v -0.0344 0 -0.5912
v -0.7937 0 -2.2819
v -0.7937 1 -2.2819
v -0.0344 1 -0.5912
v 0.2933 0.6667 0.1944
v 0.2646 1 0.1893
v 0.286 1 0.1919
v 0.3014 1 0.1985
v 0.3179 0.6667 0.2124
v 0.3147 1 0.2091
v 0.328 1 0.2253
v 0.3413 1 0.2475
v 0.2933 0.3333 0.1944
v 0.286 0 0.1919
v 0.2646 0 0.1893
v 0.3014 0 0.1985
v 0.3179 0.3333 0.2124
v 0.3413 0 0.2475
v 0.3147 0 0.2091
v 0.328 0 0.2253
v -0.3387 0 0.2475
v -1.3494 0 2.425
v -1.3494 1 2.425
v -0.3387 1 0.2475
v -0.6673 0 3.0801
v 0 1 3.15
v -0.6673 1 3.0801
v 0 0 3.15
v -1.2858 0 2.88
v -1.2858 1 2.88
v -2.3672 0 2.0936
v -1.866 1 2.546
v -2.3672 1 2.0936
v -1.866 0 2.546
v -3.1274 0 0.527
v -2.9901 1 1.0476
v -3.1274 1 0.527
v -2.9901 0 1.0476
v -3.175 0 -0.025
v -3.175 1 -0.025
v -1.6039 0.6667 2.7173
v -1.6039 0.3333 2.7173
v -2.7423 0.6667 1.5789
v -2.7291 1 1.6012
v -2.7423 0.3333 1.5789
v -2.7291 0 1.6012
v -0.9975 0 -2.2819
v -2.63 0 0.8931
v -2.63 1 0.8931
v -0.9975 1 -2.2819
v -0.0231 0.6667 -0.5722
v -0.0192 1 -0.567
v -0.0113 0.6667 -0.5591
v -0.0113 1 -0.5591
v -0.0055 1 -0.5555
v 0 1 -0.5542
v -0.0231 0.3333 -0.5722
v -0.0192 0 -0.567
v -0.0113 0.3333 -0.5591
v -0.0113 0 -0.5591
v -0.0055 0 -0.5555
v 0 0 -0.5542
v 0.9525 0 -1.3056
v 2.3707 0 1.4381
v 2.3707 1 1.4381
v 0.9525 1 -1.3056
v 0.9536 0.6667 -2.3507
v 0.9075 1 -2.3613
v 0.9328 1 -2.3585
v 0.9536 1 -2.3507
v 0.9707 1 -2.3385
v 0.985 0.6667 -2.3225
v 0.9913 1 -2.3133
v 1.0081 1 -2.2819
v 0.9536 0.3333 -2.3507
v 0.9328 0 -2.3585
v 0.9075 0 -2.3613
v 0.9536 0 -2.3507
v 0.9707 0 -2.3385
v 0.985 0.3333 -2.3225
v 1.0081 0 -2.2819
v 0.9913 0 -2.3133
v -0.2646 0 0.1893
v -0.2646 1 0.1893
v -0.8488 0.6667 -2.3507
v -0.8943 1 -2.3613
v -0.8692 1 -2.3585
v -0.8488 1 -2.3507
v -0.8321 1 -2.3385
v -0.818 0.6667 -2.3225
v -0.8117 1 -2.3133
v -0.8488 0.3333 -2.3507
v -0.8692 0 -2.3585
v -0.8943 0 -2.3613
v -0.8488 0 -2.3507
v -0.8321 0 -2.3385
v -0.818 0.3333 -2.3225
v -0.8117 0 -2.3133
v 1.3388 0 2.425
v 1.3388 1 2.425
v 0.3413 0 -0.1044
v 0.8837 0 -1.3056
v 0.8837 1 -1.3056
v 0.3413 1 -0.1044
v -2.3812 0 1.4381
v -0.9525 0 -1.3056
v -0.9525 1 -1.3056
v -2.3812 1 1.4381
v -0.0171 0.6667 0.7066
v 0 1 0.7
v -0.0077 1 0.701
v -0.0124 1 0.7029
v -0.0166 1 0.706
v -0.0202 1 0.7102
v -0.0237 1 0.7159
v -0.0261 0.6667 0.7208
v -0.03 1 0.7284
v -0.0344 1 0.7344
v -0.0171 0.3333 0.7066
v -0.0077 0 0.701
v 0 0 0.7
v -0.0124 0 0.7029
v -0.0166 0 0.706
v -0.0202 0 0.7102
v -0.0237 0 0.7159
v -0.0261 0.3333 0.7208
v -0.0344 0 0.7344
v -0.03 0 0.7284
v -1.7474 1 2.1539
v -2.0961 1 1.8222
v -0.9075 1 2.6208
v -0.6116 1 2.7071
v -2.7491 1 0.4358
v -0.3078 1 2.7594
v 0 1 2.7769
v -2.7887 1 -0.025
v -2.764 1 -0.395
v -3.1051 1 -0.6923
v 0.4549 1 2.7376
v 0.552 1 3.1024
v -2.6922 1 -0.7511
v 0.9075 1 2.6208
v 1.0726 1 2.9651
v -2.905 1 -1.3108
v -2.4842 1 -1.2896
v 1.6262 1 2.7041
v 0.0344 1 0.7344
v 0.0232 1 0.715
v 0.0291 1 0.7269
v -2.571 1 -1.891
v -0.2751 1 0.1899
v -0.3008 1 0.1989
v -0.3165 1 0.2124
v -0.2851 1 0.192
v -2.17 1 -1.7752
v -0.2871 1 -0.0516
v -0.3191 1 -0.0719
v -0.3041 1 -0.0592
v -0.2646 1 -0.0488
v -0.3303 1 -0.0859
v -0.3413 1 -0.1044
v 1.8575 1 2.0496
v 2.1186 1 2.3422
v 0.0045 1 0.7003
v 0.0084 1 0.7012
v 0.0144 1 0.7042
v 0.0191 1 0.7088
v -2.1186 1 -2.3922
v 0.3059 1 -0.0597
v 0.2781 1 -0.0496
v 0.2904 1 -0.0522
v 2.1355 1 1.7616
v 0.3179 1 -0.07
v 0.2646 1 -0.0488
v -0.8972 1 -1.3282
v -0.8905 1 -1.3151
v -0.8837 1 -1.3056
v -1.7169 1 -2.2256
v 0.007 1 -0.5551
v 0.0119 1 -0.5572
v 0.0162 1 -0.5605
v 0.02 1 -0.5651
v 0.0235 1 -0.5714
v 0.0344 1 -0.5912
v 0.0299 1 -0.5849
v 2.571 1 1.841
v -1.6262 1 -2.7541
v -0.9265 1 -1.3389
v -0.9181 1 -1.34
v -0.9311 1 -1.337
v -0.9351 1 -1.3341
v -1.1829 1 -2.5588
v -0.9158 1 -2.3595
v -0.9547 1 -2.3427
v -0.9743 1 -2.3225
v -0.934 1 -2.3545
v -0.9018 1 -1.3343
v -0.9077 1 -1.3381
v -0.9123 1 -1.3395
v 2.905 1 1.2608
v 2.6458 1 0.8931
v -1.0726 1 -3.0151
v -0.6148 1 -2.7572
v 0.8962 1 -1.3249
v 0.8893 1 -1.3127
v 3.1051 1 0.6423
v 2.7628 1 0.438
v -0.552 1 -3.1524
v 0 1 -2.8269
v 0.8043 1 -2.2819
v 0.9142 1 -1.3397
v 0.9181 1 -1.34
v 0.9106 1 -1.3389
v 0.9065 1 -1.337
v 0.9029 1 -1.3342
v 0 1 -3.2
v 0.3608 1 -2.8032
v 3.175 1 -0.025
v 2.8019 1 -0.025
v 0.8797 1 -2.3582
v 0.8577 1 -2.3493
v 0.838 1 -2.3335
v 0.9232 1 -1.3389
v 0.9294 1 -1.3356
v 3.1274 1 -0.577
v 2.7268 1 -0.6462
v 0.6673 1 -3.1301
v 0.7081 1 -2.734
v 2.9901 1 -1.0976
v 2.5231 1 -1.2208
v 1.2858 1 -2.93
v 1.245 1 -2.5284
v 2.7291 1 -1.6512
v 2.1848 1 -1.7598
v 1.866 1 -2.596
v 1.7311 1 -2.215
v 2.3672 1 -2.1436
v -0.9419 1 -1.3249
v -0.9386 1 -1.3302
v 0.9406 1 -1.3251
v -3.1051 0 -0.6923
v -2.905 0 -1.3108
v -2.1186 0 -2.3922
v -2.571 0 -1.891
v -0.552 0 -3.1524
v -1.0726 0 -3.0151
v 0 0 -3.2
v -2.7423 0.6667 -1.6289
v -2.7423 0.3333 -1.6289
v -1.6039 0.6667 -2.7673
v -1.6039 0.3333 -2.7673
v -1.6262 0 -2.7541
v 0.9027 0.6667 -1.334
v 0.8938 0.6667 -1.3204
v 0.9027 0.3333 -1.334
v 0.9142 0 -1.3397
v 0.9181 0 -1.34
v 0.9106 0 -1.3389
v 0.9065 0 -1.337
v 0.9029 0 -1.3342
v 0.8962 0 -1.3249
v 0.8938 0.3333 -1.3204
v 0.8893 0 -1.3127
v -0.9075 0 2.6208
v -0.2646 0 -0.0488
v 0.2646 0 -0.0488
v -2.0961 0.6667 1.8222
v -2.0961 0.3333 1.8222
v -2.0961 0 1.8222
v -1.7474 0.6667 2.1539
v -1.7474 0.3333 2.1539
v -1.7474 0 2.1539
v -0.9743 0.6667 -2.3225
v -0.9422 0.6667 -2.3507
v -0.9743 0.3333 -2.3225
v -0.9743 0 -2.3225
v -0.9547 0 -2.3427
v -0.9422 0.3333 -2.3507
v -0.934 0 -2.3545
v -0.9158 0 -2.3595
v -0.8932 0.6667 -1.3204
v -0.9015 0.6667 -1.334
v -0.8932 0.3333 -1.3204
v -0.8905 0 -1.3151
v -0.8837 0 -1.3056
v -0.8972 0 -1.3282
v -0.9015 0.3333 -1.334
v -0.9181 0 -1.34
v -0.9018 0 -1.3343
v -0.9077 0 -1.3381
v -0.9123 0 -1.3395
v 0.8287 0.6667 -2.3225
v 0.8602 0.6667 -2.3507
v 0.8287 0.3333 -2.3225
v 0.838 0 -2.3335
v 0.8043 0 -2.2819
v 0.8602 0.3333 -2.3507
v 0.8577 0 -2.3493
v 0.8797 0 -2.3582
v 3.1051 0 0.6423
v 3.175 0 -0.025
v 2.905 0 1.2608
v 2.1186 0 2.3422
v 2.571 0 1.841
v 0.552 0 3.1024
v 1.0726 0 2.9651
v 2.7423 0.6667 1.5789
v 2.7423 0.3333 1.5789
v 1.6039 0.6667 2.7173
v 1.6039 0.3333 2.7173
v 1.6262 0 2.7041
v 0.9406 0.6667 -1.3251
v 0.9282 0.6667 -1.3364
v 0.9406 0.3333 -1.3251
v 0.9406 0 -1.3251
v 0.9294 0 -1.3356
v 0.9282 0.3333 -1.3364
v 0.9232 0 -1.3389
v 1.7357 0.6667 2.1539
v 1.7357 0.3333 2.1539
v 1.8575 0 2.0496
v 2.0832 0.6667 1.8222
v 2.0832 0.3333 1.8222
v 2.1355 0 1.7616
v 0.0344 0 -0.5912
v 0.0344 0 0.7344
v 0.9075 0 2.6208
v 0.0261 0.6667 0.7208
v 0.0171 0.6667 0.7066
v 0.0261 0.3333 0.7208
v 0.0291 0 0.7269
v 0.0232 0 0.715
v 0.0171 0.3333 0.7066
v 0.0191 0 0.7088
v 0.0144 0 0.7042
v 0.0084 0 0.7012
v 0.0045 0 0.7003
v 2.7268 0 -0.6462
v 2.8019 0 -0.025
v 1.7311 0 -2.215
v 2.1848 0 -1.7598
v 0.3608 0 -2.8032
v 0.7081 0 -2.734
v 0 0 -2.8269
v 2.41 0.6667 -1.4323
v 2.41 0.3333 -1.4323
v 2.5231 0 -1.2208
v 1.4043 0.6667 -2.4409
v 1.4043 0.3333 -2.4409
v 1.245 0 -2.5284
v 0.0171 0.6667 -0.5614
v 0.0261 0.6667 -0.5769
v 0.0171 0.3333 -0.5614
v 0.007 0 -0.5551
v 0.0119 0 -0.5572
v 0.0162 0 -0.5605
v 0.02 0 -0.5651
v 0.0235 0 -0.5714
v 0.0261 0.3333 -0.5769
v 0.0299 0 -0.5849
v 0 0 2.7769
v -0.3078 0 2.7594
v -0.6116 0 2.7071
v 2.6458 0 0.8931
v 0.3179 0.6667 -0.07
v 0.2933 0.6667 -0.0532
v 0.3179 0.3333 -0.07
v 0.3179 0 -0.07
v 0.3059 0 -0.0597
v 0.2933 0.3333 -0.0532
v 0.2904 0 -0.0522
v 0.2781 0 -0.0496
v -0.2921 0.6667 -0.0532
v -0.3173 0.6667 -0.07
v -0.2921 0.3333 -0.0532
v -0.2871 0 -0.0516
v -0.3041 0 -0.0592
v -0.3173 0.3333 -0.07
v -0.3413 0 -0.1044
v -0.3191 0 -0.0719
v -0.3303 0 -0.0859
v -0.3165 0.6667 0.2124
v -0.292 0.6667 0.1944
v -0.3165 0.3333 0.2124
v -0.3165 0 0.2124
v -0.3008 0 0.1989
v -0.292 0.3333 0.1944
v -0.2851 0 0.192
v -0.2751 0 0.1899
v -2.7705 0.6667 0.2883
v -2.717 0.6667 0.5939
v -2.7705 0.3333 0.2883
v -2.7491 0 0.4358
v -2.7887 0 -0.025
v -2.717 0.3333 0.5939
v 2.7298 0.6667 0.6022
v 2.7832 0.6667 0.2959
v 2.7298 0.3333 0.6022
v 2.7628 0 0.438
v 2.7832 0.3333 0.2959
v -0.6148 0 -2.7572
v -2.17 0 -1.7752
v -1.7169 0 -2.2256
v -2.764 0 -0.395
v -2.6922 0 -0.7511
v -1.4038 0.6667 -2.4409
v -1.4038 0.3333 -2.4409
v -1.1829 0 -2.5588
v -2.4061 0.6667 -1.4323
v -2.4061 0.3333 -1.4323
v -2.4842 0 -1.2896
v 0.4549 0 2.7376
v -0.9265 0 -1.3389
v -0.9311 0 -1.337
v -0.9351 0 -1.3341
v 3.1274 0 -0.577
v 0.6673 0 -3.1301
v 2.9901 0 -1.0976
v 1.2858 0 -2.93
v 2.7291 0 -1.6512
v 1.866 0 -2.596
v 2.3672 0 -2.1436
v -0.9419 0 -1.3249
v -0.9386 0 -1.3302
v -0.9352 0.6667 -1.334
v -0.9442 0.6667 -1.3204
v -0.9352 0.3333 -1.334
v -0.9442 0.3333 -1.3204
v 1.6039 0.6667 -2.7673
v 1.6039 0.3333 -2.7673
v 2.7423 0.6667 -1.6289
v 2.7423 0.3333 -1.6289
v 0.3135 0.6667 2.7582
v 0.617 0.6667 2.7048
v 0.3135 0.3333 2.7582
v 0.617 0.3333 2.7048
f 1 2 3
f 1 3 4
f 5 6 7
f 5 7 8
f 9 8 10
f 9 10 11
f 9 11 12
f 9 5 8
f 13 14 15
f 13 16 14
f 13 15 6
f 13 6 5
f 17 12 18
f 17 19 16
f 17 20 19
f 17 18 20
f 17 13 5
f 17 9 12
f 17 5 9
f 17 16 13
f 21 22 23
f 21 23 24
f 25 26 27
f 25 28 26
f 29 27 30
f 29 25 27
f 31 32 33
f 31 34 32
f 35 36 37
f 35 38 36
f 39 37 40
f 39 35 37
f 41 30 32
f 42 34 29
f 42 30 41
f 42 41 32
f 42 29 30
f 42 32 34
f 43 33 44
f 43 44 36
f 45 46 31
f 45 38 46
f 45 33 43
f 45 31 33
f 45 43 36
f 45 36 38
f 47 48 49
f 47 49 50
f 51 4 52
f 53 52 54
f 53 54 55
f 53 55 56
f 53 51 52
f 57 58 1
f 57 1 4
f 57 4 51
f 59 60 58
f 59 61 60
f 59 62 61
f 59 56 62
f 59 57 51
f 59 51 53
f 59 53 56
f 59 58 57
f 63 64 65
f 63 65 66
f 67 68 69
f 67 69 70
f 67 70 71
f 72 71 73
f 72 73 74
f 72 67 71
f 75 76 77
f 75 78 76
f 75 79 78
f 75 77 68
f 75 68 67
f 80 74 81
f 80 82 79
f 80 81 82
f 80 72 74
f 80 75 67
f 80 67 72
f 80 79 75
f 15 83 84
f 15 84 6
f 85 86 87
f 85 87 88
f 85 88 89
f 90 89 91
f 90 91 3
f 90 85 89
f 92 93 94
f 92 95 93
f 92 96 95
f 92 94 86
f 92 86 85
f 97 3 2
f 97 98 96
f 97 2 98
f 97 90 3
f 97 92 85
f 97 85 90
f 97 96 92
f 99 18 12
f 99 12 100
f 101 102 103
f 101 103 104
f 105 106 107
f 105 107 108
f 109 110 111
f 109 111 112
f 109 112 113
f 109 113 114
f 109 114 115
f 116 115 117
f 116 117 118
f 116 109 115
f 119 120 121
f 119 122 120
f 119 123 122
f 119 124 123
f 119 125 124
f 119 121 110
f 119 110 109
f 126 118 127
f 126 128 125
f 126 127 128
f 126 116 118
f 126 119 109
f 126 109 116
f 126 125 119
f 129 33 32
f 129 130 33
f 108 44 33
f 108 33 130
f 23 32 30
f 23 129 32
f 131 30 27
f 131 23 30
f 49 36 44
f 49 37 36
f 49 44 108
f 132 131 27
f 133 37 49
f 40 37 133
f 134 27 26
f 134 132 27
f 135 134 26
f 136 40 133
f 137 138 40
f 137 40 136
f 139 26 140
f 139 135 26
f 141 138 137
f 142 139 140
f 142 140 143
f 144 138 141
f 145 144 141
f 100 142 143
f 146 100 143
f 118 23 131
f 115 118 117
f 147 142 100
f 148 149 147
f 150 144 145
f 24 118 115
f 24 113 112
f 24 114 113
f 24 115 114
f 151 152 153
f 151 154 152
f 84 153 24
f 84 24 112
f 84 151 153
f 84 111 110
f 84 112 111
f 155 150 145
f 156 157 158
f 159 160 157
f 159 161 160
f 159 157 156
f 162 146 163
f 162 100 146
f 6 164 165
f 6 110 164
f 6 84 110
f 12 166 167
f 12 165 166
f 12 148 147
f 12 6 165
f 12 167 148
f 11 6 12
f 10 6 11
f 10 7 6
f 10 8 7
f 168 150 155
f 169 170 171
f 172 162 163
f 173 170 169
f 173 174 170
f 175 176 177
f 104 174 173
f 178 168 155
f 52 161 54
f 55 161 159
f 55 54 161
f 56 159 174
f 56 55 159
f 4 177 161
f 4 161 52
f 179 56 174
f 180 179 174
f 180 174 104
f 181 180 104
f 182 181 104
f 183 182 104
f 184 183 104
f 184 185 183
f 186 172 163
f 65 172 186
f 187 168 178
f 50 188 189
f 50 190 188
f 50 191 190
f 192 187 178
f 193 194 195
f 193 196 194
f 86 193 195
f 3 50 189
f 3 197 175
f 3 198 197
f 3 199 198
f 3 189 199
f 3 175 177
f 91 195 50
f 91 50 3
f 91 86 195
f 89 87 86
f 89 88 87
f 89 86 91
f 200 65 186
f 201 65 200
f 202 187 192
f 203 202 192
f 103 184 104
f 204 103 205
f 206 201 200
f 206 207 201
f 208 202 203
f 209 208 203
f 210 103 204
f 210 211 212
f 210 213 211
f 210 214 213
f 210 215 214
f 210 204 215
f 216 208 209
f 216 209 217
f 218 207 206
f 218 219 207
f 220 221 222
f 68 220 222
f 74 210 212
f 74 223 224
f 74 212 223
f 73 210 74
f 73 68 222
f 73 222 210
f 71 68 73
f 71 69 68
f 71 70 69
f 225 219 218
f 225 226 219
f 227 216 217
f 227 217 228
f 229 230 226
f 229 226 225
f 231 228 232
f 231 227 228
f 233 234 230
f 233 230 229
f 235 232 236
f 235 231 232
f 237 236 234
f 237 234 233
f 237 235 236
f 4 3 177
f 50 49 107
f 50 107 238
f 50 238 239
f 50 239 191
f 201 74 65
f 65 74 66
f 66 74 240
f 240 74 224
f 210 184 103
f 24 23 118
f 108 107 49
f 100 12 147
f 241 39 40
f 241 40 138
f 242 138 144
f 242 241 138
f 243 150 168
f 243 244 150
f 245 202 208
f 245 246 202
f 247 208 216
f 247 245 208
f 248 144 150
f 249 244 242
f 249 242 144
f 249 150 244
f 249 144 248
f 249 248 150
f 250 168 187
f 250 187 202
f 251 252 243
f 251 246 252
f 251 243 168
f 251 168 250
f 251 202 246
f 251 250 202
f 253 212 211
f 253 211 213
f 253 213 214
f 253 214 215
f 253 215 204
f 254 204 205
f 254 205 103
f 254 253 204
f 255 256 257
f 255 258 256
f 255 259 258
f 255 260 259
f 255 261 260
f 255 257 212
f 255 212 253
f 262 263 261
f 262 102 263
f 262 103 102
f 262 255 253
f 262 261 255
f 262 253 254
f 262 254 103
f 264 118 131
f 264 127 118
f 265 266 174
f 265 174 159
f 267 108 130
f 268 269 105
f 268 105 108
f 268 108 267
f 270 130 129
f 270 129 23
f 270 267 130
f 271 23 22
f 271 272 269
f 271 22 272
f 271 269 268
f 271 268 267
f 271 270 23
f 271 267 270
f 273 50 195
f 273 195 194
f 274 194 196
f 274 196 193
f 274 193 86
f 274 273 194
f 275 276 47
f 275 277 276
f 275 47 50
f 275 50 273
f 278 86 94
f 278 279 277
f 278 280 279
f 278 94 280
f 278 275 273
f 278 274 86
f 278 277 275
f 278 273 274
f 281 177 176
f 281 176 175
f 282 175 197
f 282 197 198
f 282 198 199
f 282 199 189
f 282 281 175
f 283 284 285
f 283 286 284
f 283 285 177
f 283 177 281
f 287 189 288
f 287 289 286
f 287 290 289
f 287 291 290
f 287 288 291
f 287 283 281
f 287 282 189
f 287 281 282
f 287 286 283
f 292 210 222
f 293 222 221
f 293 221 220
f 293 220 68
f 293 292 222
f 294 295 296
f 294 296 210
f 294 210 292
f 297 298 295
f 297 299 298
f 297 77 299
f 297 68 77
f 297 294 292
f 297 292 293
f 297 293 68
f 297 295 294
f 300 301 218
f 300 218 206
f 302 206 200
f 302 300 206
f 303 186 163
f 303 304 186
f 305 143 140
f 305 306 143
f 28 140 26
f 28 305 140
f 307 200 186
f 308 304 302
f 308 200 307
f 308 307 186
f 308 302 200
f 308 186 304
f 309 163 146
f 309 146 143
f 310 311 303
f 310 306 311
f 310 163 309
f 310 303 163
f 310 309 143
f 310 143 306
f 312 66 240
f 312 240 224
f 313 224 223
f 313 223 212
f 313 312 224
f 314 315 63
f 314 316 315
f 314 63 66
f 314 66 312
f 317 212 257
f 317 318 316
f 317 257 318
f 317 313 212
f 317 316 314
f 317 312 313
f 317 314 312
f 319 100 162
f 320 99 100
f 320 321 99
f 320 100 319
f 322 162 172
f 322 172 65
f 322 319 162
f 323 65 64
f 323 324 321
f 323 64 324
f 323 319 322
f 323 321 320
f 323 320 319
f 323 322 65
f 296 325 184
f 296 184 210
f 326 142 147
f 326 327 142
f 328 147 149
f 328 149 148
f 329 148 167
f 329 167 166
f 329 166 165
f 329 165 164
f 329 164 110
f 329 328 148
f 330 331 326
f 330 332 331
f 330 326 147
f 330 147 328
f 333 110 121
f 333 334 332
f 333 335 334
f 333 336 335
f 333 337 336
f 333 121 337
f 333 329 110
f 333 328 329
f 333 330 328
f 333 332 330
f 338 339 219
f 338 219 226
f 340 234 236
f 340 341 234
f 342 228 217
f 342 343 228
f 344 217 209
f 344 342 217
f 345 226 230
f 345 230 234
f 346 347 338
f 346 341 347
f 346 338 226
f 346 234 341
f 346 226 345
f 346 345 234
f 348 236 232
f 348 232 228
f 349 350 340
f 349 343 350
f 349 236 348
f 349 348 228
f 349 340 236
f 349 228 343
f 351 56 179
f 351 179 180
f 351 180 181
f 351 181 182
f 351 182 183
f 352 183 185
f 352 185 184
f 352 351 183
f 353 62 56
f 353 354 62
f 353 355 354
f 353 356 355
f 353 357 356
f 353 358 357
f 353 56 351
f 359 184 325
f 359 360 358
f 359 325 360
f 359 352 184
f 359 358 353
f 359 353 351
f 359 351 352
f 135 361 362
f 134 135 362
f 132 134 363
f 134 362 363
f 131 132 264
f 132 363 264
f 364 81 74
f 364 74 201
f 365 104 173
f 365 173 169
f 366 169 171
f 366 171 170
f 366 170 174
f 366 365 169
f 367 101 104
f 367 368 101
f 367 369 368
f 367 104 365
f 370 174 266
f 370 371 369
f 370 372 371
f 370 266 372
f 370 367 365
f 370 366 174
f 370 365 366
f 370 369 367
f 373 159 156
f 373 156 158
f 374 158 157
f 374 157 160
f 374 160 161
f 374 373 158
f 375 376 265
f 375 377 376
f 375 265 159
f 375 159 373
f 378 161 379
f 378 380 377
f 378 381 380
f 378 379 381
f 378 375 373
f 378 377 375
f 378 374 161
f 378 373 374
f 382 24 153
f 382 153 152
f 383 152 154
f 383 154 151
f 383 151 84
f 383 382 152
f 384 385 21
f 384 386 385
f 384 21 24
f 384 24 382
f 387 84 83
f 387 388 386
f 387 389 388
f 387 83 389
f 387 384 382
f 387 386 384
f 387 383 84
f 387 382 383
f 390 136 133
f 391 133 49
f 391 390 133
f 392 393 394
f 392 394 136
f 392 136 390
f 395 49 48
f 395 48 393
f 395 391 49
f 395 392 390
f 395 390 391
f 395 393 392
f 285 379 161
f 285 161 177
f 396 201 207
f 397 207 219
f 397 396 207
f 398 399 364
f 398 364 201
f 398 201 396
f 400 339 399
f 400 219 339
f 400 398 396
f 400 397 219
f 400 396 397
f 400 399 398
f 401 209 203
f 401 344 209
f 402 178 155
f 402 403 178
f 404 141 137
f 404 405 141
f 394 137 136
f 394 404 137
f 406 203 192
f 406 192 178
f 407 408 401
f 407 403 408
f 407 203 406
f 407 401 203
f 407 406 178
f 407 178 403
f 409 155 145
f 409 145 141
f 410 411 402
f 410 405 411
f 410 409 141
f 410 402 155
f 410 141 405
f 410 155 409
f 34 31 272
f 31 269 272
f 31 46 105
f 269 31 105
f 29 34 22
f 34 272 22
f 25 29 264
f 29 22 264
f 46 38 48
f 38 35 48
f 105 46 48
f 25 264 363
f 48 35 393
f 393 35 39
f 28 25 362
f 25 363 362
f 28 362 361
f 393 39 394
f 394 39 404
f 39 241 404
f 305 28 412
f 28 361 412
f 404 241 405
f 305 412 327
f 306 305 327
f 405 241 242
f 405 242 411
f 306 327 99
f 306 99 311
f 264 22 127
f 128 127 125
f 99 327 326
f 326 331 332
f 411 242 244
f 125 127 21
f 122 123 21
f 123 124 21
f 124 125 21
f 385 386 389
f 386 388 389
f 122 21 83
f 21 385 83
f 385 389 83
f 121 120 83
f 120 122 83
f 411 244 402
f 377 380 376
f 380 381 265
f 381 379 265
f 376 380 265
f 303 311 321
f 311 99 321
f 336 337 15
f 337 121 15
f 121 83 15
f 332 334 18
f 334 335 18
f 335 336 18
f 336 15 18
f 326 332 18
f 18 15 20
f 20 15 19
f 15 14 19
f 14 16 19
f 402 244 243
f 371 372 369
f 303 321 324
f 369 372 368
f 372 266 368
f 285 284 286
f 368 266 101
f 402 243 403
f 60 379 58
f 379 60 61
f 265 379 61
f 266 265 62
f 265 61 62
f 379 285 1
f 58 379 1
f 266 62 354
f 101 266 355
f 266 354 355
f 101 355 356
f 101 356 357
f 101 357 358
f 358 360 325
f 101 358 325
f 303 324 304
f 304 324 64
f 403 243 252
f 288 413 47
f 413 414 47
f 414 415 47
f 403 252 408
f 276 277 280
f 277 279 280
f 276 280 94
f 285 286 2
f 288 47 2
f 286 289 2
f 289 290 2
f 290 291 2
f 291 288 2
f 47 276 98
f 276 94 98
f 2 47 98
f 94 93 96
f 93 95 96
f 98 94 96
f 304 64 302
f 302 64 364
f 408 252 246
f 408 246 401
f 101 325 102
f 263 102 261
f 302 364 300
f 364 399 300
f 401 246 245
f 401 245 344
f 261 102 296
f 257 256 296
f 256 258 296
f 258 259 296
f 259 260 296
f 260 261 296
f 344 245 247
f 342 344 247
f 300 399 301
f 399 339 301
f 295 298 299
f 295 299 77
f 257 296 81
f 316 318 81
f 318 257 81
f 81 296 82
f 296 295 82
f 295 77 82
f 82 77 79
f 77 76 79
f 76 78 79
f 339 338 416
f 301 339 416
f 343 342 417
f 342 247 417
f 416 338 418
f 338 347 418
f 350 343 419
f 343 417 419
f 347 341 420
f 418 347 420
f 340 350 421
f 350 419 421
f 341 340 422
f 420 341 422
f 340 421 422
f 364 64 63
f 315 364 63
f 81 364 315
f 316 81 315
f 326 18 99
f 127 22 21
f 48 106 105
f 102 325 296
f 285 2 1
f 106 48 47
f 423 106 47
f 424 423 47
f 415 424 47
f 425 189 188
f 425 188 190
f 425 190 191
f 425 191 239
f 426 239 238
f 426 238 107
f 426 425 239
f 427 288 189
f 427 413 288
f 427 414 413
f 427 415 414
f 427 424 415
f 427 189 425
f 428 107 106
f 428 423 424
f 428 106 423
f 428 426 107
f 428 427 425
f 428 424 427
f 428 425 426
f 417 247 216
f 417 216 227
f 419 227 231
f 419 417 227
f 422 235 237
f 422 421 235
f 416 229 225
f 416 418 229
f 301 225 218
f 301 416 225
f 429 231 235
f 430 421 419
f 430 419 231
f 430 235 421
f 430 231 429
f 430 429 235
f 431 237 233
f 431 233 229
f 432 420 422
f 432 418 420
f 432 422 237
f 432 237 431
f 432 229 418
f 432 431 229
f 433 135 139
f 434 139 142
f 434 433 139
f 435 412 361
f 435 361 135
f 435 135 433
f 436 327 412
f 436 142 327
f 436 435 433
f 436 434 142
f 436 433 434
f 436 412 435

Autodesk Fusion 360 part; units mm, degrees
sketch "Sketch1" plane through (0, 0, 0) normal (0, 1, 0) x (1, 0, 0)
  spline S0 degree 3 poles (0, -3.15) (-1.7568, -3.15) (-3.175, -1.7318) (-3.175, 0.025) knots 0 0 0 0 1 1 1 1
  spline S1 degree 3 poles (-3.175, 0.025) (-3.175, 1.7818) (-1.7568, 3.2) (0, 3.2) knots 0 0 0 0 1 1 1 1
  spline S2 degree 3 poles (0, 3.2) (1.7568, 3.2) (3.175, 1.7818) (3.175, 0.025) knots 0 0 0 0 1 1 1 1
  spline S3 degree 3 poles (3.175, 0.025) (3.175, -1.7318) (1.7568, -3.15) (0, -3.15) knots 0 0 0 0 1 1 1 1
  spline S4 degree 3 poles (0, -2.7769) (0.3175, -2.7769) (0.6244, -2.7187) (0.9075, -2.6208) knots 0 0 0 0 1 1 1 1
  line L0 (0.9075, -2.6208) -> (0.0344, -0.7344)
  spline S5 degree 3 poles (0.0344, -0.7344) (0.0238, -0.7238) (0.0238, -0.7) (0, -0.7) knots 0 0 0 0 1 1 1 1
  spline S6 degree 3 poles (0, -0.7) (-0.0238, -0.7) (-0.0238, -0.7238) (-0.0344, -0.7344) knots 0 0 0 0 1 1 1 1
  line L1 (-0.0344, -0.7344) -> (-0.9075, -2.6208)
  line L2 (-1.3494, -2.425) -> (-0.3387, -0.2475)
  spline S7 degree 3 poles (-0.3387, -0.2475) (-0.3175, -0.2025) (-0.2937, -0.1893) (-0.2646, -0.1893) knots 0 0 0 0 1 1 1 1
  line L3 (-0.2646, -0.1893) -> (0.2646, -0.1893)
  spline S8 degree 3 poles (0.2646, -0.1893) (0.2963, -0.1893) (0.3175, -0.2025) (0.3413, -0.2475) knots 0 0 0 0 1 1 1 1
  line L4 (0.3413, -0.2475) -> (1.3388, -2.425)
  spline S9 degree 3 poles (1.3388, -2.425) (1.7568, -2.1869) (2.1167, -1.8456) (2.3707, -1.4381) knots 0 0 0 0 1 1 1 1
  line L5 (2.3707, -1.4381) -> (0.9525, 1.3056)
  spline S10 degree 3 poles (0.9525, 1.3056) (0.9419, 1.3294) (0.926, 1.34) (0.9181, 1.34) knots 0 0 0 0 1 1 1 1
  spline S11 degree 3 poles (0.9181, 1.34) (0.8969, 1.34) (0.8969, 1.3188) (0.8837, 1.3056) knots 0 0 0 0 1 1 1 1
  line L6 (0.8837, 1.3056) -> (0.3413, 0.1044)
  spline S12 degree 3 poles (0.3413, 0.1044) (0.3175, 0.0594) (0.2963, 0.0488) (0.2646, 0.0488) knots 0 0 0 0 1 1 1 1
  line L7 (0.2646, 0.0488) -> (-0.2646, 0.0488)
  spline S13 degree 3 poles (-0.2646, 0.0488) (-0.2937, 0.0488) (-0.3175, 0.0594) (-0.3413, 0.1044) knots 0 0 0 0 1 1 1 1
  line L8 (-0.3413, 0.1044) -> (-0.8837, 1.3056)
  spline S14 degree 3 poles (-0.8837, 1.3056) (-0.8969, 1.3188) (-0.8943, 1.34) (-0.9181, 1.34) knots 0 0 0 0 1 1 1 1
  spline S15 degree 3 poles (-0.9181, 1.34) (-0.9419, 1.34) (-0.9419, 1.3188) (-0.9525, 1.3056) knots 0 0 0 0 1 1 1 1
  line L9 (-0.9525, 1.3056) -> (-2.3812, -1.4381)
  spline S16 degree 3 poles (-2.3812, -1.4381) (-2.1325, -1.8456) (-1.7674, -2.1869) (-1.3494, -2.425) knots 0 0 0 0 1 1 1 1
  line L10 (-2.63, -0.8931) -> (-0.9975, 2.2819)
  spline S17 degree 3 poles (-0.9975, 2.2819) (-0.9763, 2.3269) (-0.9525, 2.3613) (-0.8943, 2.3613) knots 0 0 0 0 1 1 1 1
  spline S18 degree 3 poles (-0.8943, 2.3613) (-0.8387, 2.3613) (-0.8176, 2.3269) (-0.7937, 2.2819) knots 0 0 0 0 1 1 1 1
  line L11 (-0.7937, 2.2819) -> (-0.0344, 0.5912)
  spline S19 degree 3 poles (-0.0344, 0.5912) (-0.0238, 0.57) (-0.0106, 0.5542) (0, 0.5542) knots 0 0 0 0 1 1 1 1
  spline S20 degree 3 poles (0, 0.5542) (0.0238, 0.5542) (0.0238, 0.5806) (0.0344, 0.5912) knots 0 0 0 0 1 1 1 1
  line L12 (0.0344, 0.5912) -> (0.8043, 2.2819)
  spline S21 degree 3 poles (0.8043, 2.2819) (0.8281, 2.3269) (0.8493, 2.3613) (0.9075, 2.3613) knots 0 0 0 0 1 1 1 1
  spline S22 degree 3 poles (0.9075, 2.3613) (0.9631, 2.3613) (0.9869, 2.3269) (1.0081, 2.2819) knots 0 0 0 0 1 1 1 1
  line L13 (1.0081, 2.2819) -> (2.6458, -0.8931)
  spline S23 degree 3 poles (2.6458, -0.8931) (2.7437, -0.61) (2.8019, -0.3031) (2.8019, 0.025) knots 0 0 0 0 1 1 1 1
  spline S24 degree 3 poles (2.8019, 0.025) (2.7887, 1.5569) (1.5319, 2.8269) (0, 2.8269) knots 0 0 0 0 1 1 1 1
  spline S25 degree 3 poles (0, 2.8269) (-1.5319, 2.8269) (-2.7887, 1.5569) (-2.7887, 0.025) knots 0 0 0 0 1 1 1 1
  spline S26 degree 3 poles (-2.7887, 0.025) (-2.7887, -0.2925) (-2.7331, -0.5968) (-2.63, -0.8931) knots 0 0 0 0 1 1 1 1
  arc A0 (-0.9075, -2.6208) -> (0.9075, -2.6208) centre (0, -0.0609) ccw
extrude "Extrude2" add sketch "Sketch1" along normal blind 1
